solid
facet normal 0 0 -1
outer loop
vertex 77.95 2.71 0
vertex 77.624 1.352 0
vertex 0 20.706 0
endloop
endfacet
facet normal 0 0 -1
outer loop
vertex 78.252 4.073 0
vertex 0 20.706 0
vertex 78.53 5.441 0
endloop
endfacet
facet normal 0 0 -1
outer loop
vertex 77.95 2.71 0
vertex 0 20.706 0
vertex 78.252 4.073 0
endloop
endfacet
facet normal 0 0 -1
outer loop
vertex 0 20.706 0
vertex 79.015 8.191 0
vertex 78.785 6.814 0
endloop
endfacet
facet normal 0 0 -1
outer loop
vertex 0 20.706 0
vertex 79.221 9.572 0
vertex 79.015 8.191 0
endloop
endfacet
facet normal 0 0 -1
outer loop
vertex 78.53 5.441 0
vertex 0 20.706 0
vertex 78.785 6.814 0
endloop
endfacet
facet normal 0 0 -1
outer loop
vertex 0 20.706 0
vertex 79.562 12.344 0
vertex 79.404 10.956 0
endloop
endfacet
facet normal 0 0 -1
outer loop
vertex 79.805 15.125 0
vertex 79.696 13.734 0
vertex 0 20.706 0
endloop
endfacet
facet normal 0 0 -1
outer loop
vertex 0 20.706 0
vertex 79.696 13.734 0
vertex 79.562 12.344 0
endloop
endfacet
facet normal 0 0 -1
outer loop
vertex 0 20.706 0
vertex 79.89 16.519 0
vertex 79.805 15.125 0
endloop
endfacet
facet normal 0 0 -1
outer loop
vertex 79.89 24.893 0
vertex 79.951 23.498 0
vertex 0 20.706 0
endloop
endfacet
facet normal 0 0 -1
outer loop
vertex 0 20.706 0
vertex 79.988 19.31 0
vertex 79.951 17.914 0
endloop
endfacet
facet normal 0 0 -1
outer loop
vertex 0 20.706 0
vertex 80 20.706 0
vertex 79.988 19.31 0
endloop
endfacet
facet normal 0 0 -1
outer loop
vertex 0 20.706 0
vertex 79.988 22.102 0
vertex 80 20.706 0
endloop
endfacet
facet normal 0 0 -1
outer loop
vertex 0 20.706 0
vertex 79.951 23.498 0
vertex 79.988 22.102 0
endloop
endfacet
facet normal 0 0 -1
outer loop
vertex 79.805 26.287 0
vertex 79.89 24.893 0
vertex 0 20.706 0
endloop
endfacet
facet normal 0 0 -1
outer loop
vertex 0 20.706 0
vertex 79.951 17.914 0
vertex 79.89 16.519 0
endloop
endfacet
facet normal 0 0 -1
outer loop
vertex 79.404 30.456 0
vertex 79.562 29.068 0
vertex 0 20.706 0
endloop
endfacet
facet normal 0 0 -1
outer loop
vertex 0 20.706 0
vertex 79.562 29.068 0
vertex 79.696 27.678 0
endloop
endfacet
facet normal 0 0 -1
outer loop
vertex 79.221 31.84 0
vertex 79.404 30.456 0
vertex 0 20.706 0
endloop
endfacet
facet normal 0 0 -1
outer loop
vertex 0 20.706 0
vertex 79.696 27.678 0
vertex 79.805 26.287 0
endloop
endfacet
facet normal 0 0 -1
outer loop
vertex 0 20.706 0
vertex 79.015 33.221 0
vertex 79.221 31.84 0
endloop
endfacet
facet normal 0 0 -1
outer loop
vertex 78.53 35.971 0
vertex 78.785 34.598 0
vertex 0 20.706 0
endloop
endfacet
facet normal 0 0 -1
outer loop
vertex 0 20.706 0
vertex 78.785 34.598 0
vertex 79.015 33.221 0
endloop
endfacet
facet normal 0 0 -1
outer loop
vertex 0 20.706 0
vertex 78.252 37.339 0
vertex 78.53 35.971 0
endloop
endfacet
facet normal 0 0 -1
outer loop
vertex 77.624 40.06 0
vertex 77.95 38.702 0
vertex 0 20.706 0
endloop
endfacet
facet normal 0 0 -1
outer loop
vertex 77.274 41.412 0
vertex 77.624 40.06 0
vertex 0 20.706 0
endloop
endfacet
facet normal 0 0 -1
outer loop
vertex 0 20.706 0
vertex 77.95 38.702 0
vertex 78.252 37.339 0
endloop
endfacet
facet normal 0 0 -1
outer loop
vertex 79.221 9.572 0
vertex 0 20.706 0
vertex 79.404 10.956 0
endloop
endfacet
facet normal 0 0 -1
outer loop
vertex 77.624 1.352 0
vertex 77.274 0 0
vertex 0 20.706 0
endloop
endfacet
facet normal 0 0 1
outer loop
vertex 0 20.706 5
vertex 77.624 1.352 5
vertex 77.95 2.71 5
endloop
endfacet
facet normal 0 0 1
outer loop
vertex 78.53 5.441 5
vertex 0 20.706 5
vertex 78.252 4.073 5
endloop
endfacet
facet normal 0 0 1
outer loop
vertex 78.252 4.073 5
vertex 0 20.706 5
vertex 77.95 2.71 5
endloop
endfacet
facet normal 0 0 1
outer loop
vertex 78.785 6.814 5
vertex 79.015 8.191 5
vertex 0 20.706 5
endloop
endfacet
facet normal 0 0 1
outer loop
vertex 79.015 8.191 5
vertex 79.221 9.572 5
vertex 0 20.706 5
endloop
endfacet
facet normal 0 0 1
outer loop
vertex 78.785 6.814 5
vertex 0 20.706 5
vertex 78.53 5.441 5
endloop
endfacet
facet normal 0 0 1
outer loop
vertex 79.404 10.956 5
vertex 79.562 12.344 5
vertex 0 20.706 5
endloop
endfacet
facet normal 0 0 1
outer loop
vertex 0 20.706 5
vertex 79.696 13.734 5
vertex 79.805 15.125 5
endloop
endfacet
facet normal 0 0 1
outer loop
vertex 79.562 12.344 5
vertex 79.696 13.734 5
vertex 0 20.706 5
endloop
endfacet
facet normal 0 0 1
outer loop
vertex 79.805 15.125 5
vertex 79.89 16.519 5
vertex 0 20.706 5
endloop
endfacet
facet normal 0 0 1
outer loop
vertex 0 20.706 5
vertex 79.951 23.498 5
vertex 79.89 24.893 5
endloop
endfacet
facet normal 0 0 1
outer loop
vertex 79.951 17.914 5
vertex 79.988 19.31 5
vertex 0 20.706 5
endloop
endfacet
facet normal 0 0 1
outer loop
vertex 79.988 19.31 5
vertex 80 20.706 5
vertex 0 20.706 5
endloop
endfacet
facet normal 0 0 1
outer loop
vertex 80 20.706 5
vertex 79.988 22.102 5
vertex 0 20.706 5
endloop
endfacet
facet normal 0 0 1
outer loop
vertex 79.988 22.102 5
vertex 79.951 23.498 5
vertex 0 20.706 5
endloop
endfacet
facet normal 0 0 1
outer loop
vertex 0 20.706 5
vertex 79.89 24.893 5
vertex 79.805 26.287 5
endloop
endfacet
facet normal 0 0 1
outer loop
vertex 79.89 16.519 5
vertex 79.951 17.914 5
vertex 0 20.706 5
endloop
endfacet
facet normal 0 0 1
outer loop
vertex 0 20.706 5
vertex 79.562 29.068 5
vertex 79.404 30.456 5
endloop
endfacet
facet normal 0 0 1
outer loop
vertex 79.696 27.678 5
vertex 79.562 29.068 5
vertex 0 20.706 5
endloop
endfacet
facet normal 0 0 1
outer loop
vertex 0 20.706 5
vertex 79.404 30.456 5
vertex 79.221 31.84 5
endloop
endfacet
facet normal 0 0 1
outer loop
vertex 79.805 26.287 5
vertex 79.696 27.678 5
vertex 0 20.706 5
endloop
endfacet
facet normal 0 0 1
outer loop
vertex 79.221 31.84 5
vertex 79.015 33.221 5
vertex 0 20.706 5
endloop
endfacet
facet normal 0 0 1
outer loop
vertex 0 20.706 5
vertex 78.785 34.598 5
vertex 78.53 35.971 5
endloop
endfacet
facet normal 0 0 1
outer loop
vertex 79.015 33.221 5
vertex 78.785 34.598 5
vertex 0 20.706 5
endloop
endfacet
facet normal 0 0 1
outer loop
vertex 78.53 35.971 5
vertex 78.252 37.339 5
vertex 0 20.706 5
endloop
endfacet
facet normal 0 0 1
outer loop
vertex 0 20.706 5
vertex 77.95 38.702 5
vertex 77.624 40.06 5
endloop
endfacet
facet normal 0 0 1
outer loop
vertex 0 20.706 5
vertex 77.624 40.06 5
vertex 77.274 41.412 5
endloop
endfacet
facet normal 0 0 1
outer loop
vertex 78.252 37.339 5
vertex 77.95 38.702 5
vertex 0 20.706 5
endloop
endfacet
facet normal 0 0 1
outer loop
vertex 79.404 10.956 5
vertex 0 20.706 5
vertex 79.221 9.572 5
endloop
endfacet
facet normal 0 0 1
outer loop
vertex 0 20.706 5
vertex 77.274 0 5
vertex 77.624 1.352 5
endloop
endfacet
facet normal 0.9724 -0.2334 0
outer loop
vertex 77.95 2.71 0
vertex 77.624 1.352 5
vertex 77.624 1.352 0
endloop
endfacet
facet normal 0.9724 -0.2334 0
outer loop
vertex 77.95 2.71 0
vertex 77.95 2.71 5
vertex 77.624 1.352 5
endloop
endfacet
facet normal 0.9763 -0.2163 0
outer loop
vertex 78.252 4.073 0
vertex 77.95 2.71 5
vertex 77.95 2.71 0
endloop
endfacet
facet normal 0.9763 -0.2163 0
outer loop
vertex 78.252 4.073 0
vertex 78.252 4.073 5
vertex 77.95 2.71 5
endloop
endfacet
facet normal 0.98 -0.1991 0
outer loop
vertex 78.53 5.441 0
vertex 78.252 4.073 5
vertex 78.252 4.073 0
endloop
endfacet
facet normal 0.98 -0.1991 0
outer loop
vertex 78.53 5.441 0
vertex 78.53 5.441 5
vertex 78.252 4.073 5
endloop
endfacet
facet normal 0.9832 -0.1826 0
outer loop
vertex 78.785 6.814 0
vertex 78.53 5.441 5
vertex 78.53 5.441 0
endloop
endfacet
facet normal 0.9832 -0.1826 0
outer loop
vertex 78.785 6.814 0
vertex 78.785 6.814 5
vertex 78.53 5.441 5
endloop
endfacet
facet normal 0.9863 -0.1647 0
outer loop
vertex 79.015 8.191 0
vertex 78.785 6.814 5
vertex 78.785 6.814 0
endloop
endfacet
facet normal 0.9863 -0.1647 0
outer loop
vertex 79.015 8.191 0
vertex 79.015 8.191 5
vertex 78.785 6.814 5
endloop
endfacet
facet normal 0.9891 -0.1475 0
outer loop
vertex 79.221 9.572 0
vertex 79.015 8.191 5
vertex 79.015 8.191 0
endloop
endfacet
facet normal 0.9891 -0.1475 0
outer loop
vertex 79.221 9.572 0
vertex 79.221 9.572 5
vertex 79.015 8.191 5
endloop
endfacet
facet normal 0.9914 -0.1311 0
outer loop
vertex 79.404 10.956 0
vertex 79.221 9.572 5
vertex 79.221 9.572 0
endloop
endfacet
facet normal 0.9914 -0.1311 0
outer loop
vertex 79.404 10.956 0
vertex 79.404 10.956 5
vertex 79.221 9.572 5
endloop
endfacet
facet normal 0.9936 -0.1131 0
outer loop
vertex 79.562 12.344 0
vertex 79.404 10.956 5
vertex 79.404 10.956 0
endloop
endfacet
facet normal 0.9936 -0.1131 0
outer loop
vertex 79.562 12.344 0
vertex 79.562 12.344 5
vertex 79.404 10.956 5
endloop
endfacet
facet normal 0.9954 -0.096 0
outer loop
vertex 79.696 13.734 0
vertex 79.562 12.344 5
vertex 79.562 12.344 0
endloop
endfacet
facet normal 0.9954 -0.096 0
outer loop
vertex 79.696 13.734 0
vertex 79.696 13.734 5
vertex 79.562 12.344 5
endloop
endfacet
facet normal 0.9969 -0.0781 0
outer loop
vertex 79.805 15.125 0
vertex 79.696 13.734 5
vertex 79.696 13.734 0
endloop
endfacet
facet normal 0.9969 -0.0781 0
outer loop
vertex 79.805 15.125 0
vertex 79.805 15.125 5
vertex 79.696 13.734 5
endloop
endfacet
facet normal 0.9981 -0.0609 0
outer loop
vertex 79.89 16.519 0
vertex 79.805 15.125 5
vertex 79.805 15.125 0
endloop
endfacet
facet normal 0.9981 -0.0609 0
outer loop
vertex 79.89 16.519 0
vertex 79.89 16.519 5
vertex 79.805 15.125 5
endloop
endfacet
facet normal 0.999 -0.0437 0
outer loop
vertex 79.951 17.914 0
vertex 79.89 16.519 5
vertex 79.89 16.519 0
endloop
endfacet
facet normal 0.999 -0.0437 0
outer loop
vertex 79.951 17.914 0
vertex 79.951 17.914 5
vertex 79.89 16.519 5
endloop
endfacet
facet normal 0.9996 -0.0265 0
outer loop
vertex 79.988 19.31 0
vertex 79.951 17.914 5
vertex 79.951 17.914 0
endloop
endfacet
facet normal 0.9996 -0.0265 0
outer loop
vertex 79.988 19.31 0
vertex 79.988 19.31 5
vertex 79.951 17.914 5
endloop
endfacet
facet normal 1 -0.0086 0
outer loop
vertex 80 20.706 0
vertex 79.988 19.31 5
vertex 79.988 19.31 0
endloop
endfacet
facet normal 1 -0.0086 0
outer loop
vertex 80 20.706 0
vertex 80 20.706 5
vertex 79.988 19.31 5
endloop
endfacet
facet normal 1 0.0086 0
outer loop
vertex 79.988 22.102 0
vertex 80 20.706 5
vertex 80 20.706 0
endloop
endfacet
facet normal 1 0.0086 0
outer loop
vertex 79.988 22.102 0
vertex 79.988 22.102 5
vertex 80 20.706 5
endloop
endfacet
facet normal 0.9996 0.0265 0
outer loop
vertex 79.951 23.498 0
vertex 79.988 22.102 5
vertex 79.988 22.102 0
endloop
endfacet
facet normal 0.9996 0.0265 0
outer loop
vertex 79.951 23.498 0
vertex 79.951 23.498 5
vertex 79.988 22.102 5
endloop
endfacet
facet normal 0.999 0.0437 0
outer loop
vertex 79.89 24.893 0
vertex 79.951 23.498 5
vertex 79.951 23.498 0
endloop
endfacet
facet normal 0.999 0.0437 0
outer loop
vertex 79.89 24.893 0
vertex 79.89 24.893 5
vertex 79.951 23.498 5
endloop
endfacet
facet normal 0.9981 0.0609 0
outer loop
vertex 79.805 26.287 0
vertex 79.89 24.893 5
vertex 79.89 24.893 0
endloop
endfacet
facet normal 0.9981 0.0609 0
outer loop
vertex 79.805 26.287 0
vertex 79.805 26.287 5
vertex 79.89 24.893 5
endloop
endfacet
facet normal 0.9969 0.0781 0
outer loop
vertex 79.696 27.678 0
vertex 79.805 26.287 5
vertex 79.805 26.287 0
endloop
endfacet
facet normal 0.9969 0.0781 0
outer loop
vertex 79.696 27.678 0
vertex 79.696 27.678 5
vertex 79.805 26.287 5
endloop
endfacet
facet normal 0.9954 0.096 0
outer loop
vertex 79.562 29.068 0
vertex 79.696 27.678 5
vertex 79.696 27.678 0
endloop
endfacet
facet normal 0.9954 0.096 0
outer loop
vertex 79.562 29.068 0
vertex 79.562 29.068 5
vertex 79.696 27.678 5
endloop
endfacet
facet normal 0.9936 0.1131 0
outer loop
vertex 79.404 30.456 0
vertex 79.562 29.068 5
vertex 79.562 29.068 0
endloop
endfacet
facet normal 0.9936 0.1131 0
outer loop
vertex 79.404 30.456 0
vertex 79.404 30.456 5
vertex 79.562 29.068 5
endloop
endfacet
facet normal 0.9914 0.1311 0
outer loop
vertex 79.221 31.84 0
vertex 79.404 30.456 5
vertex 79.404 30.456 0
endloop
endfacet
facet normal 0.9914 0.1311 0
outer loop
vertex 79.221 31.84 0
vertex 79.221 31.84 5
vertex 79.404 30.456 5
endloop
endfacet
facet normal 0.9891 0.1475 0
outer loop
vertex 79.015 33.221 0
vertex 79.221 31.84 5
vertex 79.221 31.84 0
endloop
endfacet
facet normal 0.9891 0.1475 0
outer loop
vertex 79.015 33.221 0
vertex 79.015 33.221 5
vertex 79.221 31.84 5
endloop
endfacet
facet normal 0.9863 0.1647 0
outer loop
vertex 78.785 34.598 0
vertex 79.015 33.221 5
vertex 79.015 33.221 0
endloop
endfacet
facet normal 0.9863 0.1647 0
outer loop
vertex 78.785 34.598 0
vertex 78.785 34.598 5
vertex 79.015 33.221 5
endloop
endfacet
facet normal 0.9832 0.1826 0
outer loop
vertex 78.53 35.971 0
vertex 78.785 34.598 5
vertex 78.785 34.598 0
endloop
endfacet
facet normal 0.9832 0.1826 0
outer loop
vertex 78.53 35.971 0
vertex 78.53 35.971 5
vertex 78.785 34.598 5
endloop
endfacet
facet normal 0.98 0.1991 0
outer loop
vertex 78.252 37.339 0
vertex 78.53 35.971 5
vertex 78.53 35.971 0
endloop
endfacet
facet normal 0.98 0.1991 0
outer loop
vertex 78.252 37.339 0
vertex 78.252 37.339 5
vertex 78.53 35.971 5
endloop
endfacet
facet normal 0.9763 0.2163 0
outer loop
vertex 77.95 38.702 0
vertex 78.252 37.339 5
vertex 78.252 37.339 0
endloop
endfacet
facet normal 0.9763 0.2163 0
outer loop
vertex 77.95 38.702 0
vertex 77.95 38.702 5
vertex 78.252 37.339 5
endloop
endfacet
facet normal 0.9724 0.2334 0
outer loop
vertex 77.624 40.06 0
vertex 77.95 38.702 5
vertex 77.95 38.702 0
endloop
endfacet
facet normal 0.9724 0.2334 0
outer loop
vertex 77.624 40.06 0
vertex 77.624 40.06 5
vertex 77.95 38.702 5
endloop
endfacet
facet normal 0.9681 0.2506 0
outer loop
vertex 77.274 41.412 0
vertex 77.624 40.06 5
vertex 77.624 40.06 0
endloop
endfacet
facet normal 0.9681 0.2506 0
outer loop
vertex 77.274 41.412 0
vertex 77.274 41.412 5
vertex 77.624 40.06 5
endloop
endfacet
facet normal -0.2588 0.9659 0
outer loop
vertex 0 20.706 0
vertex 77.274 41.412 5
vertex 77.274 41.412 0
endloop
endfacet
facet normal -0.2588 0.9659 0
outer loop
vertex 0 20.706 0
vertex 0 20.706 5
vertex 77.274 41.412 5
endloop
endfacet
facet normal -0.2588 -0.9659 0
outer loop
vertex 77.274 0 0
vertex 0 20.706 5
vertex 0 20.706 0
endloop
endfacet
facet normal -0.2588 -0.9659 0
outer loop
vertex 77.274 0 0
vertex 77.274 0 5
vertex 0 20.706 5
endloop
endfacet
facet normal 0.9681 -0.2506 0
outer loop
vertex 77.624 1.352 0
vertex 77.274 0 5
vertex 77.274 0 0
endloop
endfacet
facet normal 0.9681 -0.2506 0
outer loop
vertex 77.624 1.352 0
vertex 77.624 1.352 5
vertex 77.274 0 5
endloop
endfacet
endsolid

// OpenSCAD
$fn = 32;

// ----------------------------------------------------------------------
// Arc profile plate: sector, 32 points
// ----------------------------------------------------------------------

// --- parameters (mm) ---
sector_angle = 30;        // sector angle, degrees
sector_r = 80;            // outer radius
arc_step = 1;             // sampling step of the arc, degrees
plate_t = 5;              // plate thickness, Z

bbox_x = 2 * sector_r * sin(sector_angle / 2);  // chord of the sector
bbox_y = sector_r;  // depth of the sector (apex to arc)

profile = [[77.274, 0], [77.624, 1.352], [77.95, 2.71], [78.252, 4.073], [78.53, 5.441], [78.785, 6.814], [79.015, 8.191], [79.221, 9.572], [79.404, 10.956], [79.562, 12.344], [79.696, 13.734], [79.805, 15.125], [79.89, 16.519], [79.951, 17.914], [79.988, 19.31], [80, 20.706], [79.988, 22.102], [79.951, 23.498], [79.89, 24.893], [79.805, 26.287], [79.696, 27.678], [79.562, 29.068], [79.404, 30.456], [79.221, 31.84], [79.015, 33.221], [78.785, 34.598], [78.53, 35.971], [78.252, 37.339], [77.95, 38.702], [77.624, 40.06], [77.274, 41.412], [0, 20.706]];  // primary outline, 32 points, counter clockwise

// --- the one profile operation ---
linear_extrude(height = plate_t) polygon(points = profile);
